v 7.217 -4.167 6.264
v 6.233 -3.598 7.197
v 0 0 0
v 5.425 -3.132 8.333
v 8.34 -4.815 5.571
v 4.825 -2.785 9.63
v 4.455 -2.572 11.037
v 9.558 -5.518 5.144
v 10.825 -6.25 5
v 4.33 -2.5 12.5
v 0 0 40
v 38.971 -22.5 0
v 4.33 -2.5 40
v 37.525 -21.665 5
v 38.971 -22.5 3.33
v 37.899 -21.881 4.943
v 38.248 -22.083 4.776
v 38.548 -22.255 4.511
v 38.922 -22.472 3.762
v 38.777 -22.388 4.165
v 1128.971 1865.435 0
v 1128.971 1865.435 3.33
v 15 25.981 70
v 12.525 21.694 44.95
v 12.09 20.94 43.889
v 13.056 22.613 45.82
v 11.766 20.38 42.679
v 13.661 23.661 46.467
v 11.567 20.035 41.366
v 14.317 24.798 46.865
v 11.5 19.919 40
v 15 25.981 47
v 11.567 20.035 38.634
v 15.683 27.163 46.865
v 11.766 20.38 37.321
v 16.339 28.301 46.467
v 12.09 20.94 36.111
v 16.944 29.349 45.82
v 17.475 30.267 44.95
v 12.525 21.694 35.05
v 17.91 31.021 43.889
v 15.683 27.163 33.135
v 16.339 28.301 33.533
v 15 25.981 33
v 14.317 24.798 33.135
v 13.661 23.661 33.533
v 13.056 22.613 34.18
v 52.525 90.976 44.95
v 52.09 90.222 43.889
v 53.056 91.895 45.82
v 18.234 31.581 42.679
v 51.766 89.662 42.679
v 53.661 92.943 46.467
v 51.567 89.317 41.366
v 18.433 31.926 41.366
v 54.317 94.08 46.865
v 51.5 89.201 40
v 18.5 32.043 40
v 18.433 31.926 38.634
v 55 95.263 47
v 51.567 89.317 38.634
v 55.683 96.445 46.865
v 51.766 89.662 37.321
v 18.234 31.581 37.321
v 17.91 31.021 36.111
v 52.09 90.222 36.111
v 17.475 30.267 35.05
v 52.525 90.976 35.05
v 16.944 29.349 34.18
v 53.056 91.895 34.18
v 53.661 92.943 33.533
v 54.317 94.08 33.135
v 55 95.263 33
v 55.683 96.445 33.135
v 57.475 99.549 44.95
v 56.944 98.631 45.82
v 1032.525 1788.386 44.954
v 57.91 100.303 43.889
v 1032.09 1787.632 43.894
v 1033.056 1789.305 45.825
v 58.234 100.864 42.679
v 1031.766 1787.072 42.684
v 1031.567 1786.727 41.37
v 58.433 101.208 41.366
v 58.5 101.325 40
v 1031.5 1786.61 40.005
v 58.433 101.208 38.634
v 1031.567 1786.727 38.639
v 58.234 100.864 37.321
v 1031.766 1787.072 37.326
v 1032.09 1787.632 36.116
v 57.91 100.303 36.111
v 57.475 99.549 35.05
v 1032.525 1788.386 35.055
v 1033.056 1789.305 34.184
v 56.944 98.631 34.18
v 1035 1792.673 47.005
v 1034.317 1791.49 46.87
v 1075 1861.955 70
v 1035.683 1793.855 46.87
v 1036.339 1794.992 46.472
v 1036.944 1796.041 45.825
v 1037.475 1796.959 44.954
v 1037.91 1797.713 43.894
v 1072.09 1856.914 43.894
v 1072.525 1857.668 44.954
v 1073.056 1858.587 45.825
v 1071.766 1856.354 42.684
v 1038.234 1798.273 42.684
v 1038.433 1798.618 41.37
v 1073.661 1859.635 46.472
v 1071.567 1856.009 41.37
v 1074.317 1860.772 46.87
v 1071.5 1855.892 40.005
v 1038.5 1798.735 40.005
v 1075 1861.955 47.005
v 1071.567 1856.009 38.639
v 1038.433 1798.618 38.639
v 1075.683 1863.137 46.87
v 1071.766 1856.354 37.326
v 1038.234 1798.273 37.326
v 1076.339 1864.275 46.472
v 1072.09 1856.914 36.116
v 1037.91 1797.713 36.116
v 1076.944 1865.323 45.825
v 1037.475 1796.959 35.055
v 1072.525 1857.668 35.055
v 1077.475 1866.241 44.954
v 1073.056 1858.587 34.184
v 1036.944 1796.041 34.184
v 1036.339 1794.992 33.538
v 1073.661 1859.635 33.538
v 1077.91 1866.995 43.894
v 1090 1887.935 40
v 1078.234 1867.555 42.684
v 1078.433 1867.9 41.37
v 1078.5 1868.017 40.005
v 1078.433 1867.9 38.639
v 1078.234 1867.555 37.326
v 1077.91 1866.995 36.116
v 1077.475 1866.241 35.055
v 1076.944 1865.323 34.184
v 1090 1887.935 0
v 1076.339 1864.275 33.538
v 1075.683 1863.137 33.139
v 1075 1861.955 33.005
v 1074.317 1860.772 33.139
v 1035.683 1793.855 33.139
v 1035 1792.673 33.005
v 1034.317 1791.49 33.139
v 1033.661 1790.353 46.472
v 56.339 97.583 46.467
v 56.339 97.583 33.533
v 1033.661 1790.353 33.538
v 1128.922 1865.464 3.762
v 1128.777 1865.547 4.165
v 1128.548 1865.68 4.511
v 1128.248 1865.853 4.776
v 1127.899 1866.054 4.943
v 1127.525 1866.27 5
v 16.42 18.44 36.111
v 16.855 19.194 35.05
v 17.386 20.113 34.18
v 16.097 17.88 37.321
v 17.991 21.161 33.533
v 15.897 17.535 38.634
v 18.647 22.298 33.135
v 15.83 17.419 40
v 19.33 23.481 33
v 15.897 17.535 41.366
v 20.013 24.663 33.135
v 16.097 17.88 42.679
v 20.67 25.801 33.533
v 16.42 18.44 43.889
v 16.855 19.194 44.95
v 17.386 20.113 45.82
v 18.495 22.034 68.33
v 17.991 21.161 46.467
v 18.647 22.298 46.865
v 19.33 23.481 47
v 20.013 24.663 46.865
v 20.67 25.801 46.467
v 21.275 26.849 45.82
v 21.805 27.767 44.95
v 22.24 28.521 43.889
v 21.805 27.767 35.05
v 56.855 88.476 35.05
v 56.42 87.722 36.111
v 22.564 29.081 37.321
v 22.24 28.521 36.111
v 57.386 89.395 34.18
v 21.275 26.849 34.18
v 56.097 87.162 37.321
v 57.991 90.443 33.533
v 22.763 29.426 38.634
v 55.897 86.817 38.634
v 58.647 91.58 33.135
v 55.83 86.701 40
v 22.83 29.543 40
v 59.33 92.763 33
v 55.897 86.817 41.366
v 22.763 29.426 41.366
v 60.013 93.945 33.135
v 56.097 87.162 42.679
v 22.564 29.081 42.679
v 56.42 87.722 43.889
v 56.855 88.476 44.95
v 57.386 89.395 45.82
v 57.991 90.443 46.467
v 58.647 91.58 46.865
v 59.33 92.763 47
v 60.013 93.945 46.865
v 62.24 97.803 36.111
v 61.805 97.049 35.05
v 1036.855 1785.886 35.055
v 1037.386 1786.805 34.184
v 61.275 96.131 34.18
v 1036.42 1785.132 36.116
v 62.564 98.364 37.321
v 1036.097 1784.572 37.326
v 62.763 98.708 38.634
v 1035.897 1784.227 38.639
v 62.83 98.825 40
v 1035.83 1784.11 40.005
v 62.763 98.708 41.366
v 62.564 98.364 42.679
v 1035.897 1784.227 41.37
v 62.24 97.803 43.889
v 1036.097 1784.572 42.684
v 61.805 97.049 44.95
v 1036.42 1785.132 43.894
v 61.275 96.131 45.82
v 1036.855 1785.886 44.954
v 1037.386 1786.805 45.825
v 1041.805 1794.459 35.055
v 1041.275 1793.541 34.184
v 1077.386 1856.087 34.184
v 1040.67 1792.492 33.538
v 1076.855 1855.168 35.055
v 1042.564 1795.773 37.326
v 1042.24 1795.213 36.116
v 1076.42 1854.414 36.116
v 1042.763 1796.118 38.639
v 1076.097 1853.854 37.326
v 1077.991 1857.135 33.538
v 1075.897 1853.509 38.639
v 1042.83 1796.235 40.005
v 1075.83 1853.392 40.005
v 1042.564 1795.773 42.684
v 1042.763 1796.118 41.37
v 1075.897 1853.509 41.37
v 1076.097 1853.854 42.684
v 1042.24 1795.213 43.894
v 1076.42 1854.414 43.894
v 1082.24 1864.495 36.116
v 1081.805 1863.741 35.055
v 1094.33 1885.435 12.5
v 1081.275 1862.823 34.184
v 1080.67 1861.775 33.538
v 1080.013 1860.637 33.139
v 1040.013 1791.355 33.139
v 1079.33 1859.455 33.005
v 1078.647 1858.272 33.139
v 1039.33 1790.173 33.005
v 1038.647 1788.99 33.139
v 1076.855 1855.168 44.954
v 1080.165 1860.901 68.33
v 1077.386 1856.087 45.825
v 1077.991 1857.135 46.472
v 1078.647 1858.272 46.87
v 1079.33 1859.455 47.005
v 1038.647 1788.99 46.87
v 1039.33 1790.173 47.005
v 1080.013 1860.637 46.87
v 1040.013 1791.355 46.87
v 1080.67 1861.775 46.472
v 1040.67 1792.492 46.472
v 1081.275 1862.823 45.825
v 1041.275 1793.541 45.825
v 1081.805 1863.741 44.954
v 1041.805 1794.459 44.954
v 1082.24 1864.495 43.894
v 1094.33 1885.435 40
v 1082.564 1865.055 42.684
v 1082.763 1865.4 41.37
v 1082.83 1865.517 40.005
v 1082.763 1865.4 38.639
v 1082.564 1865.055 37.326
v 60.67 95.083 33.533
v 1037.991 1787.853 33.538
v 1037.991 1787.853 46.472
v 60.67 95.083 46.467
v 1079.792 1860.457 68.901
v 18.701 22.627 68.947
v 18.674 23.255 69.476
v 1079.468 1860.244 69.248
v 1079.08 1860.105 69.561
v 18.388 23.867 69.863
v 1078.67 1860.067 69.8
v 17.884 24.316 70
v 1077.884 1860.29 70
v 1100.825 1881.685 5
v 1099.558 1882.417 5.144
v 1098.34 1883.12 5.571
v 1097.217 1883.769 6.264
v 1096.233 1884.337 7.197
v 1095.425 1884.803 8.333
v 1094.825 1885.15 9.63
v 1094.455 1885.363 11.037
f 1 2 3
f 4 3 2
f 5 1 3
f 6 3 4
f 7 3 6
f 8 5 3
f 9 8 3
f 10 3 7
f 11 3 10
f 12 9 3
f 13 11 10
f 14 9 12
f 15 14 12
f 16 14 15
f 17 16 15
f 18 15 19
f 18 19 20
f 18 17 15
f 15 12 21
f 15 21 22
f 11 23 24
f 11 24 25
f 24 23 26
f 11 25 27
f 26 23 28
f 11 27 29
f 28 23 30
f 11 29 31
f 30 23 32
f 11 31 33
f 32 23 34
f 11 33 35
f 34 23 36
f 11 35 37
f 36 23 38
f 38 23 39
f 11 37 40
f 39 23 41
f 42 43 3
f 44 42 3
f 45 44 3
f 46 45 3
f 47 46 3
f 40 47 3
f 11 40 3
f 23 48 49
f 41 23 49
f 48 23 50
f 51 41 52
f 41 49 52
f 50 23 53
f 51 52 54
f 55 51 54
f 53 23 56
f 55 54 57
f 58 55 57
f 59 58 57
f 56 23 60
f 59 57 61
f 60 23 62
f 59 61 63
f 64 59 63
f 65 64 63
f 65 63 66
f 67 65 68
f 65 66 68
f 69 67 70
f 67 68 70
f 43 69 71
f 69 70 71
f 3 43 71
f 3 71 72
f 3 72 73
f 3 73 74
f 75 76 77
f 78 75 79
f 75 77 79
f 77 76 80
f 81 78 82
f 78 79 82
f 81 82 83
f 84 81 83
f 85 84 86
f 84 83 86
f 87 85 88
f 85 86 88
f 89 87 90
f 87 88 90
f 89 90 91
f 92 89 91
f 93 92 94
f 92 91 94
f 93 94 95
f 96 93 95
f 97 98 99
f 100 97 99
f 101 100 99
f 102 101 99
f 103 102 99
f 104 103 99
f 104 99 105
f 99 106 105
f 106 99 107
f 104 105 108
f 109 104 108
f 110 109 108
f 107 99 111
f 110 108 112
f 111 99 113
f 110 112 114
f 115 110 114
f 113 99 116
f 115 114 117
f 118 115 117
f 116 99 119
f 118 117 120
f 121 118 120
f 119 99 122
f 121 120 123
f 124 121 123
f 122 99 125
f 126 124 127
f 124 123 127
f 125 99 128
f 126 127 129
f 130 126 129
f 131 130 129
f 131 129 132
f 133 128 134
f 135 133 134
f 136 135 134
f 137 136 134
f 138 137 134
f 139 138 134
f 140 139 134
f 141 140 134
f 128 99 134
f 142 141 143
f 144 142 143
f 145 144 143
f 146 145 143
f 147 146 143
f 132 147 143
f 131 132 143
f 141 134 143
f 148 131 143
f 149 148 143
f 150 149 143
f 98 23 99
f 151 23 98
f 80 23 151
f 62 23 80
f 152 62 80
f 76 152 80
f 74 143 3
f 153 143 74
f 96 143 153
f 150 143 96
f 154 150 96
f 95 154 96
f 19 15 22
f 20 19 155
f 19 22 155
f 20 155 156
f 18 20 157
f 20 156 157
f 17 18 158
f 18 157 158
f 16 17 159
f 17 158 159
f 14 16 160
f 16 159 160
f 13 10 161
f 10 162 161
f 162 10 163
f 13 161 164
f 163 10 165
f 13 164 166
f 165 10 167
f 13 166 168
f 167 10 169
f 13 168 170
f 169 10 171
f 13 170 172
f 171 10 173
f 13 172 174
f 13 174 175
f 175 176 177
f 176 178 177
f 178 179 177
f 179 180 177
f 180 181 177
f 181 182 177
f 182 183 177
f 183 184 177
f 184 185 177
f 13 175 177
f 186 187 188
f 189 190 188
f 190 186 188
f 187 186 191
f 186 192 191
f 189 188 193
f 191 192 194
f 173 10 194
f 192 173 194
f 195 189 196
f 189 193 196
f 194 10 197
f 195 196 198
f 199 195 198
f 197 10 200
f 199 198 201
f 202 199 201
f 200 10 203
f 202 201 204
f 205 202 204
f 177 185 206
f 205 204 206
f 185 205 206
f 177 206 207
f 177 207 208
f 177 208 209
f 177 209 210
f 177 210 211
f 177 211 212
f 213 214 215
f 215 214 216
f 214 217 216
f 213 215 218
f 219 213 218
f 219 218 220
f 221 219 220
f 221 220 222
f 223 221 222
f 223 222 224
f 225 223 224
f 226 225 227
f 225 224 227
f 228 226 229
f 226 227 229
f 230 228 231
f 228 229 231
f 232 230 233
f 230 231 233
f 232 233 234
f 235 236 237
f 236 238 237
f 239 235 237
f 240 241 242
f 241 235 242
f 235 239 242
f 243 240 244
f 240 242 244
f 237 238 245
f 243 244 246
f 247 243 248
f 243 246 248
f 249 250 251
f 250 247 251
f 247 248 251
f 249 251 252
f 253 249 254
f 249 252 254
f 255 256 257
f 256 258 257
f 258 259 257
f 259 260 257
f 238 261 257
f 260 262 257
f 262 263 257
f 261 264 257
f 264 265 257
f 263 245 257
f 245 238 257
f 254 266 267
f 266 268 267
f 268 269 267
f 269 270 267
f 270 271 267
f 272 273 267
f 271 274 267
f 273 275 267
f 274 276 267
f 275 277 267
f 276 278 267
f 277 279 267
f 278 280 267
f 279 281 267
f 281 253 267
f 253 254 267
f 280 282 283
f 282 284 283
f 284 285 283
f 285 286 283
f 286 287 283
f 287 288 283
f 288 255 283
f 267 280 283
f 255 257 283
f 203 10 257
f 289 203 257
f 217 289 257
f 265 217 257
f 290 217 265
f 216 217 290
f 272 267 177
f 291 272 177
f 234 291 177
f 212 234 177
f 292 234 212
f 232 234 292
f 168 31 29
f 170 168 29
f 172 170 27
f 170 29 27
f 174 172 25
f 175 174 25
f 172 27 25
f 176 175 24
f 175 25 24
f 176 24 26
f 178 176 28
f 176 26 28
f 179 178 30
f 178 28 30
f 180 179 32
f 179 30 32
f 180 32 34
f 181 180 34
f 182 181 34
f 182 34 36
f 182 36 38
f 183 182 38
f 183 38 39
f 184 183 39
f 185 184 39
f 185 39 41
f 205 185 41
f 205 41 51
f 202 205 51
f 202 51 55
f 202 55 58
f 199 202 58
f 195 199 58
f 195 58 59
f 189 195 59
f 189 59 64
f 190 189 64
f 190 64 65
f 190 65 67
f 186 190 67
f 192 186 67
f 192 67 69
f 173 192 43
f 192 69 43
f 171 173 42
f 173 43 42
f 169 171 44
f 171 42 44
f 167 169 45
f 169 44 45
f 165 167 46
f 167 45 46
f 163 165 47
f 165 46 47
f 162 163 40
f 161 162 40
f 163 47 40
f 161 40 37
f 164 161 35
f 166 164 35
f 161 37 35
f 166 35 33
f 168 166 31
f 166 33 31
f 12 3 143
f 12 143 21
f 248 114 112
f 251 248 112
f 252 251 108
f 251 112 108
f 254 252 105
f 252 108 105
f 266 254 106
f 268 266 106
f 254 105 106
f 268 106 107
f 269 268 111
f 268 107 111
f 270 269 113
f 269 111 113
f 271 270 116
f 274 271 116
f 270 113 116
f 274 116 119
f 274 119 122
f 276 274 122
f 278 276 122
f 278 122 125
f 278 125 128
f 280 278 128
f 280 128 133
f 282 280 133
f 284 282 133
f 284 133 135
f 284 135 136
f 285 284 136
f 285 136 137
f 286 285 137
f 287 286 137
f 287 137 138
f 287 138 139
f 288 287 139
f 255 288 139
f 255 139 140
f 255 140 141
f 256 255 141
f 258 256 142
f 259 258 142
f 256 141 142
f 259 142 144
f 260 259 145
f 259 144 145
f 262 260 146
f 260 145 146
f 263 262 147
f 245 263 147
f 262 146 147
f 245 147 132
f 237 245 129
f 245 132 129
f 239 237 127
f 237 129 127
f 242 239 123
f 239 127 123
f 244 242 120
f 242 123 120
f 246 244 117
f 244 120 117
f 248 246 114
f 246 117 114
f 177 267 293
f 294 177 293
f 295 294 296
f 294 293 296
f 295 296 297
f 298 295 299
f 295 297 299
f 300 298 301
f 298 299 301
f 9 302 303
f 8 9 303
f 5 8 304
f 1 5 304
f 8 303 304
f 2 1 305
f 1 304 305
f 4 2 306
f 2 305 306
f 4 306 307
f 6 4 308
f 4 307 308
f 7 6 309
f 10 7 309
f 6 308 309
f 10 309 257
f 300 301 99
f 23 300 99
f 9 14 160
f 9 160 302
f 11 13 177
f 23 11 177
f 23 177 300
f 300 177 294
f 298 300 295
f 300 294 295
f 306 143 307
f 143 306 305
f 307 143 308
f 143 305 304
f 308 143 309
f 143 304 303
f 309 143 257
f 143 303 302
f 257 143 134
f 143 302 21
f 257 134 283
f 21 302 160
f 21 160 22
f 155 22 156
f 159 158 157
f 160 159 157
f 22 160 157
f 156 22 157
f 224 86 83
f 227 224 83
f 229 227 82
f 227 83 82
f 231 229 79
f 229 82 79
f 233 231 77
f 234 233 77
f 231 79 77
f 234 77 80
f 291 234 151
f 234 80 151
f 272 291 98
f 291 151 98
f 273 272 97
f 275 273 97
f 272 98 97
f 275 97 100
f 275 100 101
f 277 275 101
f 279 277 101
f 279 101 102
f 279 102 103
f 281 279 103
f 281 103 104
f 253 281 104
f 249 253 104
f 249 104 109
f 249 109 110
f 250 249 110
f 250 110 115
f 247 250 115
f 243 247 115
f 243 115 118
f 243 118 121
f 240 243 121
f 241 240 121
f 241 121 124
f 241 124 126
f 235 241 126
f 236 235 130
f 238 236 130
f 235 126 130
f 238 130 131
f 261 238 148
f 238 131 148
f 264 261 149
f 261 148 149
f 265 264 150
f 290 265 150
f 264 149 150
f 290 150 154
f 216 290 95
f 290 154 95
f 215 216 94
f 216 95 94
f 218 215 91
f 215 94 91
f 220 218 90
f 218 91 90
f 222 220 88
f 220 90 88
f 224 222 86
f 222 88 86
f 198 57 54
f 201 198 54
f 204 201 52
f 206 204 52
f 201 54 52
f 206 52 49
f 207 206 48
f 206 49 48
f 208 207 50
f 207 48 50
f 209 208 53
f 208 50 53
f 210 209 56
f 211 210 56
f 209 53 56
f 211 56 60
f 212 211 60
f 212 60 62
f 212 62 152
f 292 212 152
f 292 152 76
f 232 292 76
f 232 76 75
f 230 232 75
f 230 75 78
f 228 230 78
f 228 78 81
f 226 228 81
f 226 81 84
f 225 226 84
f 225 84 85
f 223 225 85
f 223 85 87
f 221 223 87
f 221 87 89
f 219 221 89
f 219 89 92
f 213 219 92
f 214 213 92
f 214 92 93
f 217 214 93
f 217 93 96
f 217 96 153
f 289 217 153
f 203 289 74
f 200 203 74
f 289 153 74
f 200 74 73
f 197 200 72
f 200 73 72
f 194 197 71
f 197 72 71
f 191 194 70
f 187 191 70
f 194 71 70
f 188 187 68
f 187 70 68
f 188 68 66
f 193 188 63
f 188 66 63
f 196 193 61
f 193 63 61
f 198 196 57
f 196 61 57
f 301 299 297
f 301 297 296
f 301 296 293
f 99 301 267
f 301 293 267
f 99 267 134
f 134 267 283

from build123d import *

# Parameters (mm, degrees)
F_70X45X5_1_DEPTH   = 2180
CUT_EXTRUDE_1_REACH = 2202.858
SKETCH_12_R         = 7
CUT_EXTRUDE_2_REACH = 2202.858
SKETCH_13_R         = 7
CHAMFER_1_SIZE      = 30
CHAMFER_2_SIZE      = 30


with BuildPart() as part:
    # 草图11 → 不等边角钢 70X45X5(1) (new body)
    with BuildSketch(Plane(origin=(1090, 1887.93538025, 0), x_dir=(0.86602540378444, -0.4999999999999978, 0), z_dir=(-0.4999999999999978, -0.86602540378444, 0))):
        with BuildLine():
            Line((0, 70), (0, 0))
            Line((0, 0), (45, 0))
            Line((45, 0), (45, 3.33))
            ThreePointArc((45, 3.33), (44.510868325, 4.510868325), (43.33, 5))
            Line((43.33, 5), (12.5, 5))
            ThreePointArc((12.5, 5), (7.196699141, 7.196699141), (5, 12.5))
            Line((5, 12.5), (5, 68.33))
            ThreePointArc((5, 68.33), (4.510868325, 69.510868325), (3.33, 70))
            Line((3.33, 70), (0, 70))
        make_face()
    extrude(amount=F_70X45X5_1_DEPTH)

    # 草图12 → 切除-拉伸1 (cut, up to next)
    with BuildSketch(Plane(origin=(0, 0, 0), x_dir=(0, 0, 1), z_dir=(-0.86602540378444, 0.49999999999999784, 0)), mode=Mode.PRIVATE) as cut_extrude_1_sk1:
        with Locations(Location((40, 30, 0), (0, 0, 270))):
            Circle(SKETCH_12_R)
    cut_extrude_1_tool1 = extrude(cut_extrude_1_sk1.sketch, amount=-CUT_EXTRUDE_1_REACH, mode=Mode.PRIVATE) & part.part
    # 草图12 → 切除-拉伸1 (cut, up to next)
    with BuildSketch(Plane(origin=(0, 0, 0), x_dir=(0, 0, 1), z_dir=(-0.86602540378444, 0.49999999999999784, 0)), mode=Mode.PRIVATE) as cut_extrude_1_sk2:
        with Locations(Location((40, 110, 0), (0, 0, 270))):
            Circle(SKETCH_12_R)
    cut_extrude_1_tool2 = extrude(cut_extrude_1_sk2.sketch, amount=-CUT_EXTRUDE_1_REACH, mode=Mode.PRIVATE) & part.part
    add(cut_extrude_1_tool1.solids().sort_by_distance((15, 25.980762, 40))[0], mode=Mode.SUBTRACT)
    add(cut_extrude_1_tool2.solids().sort_by_distance((55, 95.262794, 40))[0], mode=Mode.SUBTRACT)

    # 草图13 → 切除-拉伸2 (cut, up to next)
    with BuildSketch(Plane(origin=(0, 0, 0), x_dir=(0, 0, 1), z_dir=(-0.86602540378444, 0.49999999999999784, 0)), mode=Mode.PRIVATE) as cut_extrude_2_sk1:
        with Locations(Location((40.004723234, 2070, 0), (0, 0, 270))):
            Circle(SKETCH_13_R)
    cut_extrude_2_tool1 = extrude(cut_extrude_2_sk1.sketch, amount=-CUT_EXTRUDE_2_REACH, mode=Mode.PRIVATE) & part.part
    # 草图13 → 切除-拉伸2 (cut, up to next)
    with BuildSketch(Plane(origin=(0, 0, 0), x_dir=(0, 0, 1), z_dir=(-0.86602540378444, 0.49999999999999784, 0)), mode=Mode.PRIVATE) as cut_extrude_2_sk2:
        with Locations(Location((40.004723234, 2150, 0), (0, 0, 270))):
            Circle(SKETCH_13_R)
    cut_extrude_2_tool2 = extrude(cut_extrude_2_sk2.sketch, amount=-CUT_EXTRUDE_2_REACH, mode=Mode.PRIVATE) & part.part
    add(cut_extrude_2_tool1.solids().sort_by_distance((1035, 1792.672586, 40.004723))[0], mode=Mode.SUBTRACT)
    add(cut_extrude_2_tool2.solids().sort_by_distance((1075, 1861.954618, 40.004723))[0], mode=Mode.SUBTRACT)

    # 倒角1
    # the kernel refuses this chamfer: 30 mm, written as the material it takes off along each edge
    with BuildSketch(Plane(origin=(1159.698148536, 1847.695135431, 70), x_dir=(-0.4998109584556461, -0.8656979742248816, 0.027495876610586955), z_dir=(-0.86602540378444, 0.4999999999999978, 0))) as chamfer_1_piece_1:
        Polygon((CHAMFER_1_SIZE * 0.999621916911, -CHAMFER_1_SIZE * 0.0274958766106), (-CHAMFER_1_SIZE * 0.0274958766106, -CHAMFER_1_SIZE * 0.999621916911), (0, 0), align=None)
    extrude(amount=157.630979278, mode=Mode.SUBTRACT)

    # 倒角2
    # the kernel refuses this chamfer: 30 mm, written as the material it takes off along each edge
    with BuildSketch(Plane(origin=(69.698148536, -40.240244819, 70), x_dir=(-0.013747938305293052, -0.02381212764409008, -0.9996219169112966), z_dir=(-0.86602540378444, 0.4999999999999978, 0))) as chamfer_2_piece_1:
        Polygon((CHAMFER_2_SIZE * 0.999621916911, -CHAMFER_2_SIZE * 0.0274958766106), (-CHAMFER_2_SIZE * 0.0274958766106, -CHAMFER_2_SIZE * 0.999621916911), (0, 0), align=None)
    extrude(amount=157.630979278, mode=Mode.SUBTRACT)


solid = part.part
